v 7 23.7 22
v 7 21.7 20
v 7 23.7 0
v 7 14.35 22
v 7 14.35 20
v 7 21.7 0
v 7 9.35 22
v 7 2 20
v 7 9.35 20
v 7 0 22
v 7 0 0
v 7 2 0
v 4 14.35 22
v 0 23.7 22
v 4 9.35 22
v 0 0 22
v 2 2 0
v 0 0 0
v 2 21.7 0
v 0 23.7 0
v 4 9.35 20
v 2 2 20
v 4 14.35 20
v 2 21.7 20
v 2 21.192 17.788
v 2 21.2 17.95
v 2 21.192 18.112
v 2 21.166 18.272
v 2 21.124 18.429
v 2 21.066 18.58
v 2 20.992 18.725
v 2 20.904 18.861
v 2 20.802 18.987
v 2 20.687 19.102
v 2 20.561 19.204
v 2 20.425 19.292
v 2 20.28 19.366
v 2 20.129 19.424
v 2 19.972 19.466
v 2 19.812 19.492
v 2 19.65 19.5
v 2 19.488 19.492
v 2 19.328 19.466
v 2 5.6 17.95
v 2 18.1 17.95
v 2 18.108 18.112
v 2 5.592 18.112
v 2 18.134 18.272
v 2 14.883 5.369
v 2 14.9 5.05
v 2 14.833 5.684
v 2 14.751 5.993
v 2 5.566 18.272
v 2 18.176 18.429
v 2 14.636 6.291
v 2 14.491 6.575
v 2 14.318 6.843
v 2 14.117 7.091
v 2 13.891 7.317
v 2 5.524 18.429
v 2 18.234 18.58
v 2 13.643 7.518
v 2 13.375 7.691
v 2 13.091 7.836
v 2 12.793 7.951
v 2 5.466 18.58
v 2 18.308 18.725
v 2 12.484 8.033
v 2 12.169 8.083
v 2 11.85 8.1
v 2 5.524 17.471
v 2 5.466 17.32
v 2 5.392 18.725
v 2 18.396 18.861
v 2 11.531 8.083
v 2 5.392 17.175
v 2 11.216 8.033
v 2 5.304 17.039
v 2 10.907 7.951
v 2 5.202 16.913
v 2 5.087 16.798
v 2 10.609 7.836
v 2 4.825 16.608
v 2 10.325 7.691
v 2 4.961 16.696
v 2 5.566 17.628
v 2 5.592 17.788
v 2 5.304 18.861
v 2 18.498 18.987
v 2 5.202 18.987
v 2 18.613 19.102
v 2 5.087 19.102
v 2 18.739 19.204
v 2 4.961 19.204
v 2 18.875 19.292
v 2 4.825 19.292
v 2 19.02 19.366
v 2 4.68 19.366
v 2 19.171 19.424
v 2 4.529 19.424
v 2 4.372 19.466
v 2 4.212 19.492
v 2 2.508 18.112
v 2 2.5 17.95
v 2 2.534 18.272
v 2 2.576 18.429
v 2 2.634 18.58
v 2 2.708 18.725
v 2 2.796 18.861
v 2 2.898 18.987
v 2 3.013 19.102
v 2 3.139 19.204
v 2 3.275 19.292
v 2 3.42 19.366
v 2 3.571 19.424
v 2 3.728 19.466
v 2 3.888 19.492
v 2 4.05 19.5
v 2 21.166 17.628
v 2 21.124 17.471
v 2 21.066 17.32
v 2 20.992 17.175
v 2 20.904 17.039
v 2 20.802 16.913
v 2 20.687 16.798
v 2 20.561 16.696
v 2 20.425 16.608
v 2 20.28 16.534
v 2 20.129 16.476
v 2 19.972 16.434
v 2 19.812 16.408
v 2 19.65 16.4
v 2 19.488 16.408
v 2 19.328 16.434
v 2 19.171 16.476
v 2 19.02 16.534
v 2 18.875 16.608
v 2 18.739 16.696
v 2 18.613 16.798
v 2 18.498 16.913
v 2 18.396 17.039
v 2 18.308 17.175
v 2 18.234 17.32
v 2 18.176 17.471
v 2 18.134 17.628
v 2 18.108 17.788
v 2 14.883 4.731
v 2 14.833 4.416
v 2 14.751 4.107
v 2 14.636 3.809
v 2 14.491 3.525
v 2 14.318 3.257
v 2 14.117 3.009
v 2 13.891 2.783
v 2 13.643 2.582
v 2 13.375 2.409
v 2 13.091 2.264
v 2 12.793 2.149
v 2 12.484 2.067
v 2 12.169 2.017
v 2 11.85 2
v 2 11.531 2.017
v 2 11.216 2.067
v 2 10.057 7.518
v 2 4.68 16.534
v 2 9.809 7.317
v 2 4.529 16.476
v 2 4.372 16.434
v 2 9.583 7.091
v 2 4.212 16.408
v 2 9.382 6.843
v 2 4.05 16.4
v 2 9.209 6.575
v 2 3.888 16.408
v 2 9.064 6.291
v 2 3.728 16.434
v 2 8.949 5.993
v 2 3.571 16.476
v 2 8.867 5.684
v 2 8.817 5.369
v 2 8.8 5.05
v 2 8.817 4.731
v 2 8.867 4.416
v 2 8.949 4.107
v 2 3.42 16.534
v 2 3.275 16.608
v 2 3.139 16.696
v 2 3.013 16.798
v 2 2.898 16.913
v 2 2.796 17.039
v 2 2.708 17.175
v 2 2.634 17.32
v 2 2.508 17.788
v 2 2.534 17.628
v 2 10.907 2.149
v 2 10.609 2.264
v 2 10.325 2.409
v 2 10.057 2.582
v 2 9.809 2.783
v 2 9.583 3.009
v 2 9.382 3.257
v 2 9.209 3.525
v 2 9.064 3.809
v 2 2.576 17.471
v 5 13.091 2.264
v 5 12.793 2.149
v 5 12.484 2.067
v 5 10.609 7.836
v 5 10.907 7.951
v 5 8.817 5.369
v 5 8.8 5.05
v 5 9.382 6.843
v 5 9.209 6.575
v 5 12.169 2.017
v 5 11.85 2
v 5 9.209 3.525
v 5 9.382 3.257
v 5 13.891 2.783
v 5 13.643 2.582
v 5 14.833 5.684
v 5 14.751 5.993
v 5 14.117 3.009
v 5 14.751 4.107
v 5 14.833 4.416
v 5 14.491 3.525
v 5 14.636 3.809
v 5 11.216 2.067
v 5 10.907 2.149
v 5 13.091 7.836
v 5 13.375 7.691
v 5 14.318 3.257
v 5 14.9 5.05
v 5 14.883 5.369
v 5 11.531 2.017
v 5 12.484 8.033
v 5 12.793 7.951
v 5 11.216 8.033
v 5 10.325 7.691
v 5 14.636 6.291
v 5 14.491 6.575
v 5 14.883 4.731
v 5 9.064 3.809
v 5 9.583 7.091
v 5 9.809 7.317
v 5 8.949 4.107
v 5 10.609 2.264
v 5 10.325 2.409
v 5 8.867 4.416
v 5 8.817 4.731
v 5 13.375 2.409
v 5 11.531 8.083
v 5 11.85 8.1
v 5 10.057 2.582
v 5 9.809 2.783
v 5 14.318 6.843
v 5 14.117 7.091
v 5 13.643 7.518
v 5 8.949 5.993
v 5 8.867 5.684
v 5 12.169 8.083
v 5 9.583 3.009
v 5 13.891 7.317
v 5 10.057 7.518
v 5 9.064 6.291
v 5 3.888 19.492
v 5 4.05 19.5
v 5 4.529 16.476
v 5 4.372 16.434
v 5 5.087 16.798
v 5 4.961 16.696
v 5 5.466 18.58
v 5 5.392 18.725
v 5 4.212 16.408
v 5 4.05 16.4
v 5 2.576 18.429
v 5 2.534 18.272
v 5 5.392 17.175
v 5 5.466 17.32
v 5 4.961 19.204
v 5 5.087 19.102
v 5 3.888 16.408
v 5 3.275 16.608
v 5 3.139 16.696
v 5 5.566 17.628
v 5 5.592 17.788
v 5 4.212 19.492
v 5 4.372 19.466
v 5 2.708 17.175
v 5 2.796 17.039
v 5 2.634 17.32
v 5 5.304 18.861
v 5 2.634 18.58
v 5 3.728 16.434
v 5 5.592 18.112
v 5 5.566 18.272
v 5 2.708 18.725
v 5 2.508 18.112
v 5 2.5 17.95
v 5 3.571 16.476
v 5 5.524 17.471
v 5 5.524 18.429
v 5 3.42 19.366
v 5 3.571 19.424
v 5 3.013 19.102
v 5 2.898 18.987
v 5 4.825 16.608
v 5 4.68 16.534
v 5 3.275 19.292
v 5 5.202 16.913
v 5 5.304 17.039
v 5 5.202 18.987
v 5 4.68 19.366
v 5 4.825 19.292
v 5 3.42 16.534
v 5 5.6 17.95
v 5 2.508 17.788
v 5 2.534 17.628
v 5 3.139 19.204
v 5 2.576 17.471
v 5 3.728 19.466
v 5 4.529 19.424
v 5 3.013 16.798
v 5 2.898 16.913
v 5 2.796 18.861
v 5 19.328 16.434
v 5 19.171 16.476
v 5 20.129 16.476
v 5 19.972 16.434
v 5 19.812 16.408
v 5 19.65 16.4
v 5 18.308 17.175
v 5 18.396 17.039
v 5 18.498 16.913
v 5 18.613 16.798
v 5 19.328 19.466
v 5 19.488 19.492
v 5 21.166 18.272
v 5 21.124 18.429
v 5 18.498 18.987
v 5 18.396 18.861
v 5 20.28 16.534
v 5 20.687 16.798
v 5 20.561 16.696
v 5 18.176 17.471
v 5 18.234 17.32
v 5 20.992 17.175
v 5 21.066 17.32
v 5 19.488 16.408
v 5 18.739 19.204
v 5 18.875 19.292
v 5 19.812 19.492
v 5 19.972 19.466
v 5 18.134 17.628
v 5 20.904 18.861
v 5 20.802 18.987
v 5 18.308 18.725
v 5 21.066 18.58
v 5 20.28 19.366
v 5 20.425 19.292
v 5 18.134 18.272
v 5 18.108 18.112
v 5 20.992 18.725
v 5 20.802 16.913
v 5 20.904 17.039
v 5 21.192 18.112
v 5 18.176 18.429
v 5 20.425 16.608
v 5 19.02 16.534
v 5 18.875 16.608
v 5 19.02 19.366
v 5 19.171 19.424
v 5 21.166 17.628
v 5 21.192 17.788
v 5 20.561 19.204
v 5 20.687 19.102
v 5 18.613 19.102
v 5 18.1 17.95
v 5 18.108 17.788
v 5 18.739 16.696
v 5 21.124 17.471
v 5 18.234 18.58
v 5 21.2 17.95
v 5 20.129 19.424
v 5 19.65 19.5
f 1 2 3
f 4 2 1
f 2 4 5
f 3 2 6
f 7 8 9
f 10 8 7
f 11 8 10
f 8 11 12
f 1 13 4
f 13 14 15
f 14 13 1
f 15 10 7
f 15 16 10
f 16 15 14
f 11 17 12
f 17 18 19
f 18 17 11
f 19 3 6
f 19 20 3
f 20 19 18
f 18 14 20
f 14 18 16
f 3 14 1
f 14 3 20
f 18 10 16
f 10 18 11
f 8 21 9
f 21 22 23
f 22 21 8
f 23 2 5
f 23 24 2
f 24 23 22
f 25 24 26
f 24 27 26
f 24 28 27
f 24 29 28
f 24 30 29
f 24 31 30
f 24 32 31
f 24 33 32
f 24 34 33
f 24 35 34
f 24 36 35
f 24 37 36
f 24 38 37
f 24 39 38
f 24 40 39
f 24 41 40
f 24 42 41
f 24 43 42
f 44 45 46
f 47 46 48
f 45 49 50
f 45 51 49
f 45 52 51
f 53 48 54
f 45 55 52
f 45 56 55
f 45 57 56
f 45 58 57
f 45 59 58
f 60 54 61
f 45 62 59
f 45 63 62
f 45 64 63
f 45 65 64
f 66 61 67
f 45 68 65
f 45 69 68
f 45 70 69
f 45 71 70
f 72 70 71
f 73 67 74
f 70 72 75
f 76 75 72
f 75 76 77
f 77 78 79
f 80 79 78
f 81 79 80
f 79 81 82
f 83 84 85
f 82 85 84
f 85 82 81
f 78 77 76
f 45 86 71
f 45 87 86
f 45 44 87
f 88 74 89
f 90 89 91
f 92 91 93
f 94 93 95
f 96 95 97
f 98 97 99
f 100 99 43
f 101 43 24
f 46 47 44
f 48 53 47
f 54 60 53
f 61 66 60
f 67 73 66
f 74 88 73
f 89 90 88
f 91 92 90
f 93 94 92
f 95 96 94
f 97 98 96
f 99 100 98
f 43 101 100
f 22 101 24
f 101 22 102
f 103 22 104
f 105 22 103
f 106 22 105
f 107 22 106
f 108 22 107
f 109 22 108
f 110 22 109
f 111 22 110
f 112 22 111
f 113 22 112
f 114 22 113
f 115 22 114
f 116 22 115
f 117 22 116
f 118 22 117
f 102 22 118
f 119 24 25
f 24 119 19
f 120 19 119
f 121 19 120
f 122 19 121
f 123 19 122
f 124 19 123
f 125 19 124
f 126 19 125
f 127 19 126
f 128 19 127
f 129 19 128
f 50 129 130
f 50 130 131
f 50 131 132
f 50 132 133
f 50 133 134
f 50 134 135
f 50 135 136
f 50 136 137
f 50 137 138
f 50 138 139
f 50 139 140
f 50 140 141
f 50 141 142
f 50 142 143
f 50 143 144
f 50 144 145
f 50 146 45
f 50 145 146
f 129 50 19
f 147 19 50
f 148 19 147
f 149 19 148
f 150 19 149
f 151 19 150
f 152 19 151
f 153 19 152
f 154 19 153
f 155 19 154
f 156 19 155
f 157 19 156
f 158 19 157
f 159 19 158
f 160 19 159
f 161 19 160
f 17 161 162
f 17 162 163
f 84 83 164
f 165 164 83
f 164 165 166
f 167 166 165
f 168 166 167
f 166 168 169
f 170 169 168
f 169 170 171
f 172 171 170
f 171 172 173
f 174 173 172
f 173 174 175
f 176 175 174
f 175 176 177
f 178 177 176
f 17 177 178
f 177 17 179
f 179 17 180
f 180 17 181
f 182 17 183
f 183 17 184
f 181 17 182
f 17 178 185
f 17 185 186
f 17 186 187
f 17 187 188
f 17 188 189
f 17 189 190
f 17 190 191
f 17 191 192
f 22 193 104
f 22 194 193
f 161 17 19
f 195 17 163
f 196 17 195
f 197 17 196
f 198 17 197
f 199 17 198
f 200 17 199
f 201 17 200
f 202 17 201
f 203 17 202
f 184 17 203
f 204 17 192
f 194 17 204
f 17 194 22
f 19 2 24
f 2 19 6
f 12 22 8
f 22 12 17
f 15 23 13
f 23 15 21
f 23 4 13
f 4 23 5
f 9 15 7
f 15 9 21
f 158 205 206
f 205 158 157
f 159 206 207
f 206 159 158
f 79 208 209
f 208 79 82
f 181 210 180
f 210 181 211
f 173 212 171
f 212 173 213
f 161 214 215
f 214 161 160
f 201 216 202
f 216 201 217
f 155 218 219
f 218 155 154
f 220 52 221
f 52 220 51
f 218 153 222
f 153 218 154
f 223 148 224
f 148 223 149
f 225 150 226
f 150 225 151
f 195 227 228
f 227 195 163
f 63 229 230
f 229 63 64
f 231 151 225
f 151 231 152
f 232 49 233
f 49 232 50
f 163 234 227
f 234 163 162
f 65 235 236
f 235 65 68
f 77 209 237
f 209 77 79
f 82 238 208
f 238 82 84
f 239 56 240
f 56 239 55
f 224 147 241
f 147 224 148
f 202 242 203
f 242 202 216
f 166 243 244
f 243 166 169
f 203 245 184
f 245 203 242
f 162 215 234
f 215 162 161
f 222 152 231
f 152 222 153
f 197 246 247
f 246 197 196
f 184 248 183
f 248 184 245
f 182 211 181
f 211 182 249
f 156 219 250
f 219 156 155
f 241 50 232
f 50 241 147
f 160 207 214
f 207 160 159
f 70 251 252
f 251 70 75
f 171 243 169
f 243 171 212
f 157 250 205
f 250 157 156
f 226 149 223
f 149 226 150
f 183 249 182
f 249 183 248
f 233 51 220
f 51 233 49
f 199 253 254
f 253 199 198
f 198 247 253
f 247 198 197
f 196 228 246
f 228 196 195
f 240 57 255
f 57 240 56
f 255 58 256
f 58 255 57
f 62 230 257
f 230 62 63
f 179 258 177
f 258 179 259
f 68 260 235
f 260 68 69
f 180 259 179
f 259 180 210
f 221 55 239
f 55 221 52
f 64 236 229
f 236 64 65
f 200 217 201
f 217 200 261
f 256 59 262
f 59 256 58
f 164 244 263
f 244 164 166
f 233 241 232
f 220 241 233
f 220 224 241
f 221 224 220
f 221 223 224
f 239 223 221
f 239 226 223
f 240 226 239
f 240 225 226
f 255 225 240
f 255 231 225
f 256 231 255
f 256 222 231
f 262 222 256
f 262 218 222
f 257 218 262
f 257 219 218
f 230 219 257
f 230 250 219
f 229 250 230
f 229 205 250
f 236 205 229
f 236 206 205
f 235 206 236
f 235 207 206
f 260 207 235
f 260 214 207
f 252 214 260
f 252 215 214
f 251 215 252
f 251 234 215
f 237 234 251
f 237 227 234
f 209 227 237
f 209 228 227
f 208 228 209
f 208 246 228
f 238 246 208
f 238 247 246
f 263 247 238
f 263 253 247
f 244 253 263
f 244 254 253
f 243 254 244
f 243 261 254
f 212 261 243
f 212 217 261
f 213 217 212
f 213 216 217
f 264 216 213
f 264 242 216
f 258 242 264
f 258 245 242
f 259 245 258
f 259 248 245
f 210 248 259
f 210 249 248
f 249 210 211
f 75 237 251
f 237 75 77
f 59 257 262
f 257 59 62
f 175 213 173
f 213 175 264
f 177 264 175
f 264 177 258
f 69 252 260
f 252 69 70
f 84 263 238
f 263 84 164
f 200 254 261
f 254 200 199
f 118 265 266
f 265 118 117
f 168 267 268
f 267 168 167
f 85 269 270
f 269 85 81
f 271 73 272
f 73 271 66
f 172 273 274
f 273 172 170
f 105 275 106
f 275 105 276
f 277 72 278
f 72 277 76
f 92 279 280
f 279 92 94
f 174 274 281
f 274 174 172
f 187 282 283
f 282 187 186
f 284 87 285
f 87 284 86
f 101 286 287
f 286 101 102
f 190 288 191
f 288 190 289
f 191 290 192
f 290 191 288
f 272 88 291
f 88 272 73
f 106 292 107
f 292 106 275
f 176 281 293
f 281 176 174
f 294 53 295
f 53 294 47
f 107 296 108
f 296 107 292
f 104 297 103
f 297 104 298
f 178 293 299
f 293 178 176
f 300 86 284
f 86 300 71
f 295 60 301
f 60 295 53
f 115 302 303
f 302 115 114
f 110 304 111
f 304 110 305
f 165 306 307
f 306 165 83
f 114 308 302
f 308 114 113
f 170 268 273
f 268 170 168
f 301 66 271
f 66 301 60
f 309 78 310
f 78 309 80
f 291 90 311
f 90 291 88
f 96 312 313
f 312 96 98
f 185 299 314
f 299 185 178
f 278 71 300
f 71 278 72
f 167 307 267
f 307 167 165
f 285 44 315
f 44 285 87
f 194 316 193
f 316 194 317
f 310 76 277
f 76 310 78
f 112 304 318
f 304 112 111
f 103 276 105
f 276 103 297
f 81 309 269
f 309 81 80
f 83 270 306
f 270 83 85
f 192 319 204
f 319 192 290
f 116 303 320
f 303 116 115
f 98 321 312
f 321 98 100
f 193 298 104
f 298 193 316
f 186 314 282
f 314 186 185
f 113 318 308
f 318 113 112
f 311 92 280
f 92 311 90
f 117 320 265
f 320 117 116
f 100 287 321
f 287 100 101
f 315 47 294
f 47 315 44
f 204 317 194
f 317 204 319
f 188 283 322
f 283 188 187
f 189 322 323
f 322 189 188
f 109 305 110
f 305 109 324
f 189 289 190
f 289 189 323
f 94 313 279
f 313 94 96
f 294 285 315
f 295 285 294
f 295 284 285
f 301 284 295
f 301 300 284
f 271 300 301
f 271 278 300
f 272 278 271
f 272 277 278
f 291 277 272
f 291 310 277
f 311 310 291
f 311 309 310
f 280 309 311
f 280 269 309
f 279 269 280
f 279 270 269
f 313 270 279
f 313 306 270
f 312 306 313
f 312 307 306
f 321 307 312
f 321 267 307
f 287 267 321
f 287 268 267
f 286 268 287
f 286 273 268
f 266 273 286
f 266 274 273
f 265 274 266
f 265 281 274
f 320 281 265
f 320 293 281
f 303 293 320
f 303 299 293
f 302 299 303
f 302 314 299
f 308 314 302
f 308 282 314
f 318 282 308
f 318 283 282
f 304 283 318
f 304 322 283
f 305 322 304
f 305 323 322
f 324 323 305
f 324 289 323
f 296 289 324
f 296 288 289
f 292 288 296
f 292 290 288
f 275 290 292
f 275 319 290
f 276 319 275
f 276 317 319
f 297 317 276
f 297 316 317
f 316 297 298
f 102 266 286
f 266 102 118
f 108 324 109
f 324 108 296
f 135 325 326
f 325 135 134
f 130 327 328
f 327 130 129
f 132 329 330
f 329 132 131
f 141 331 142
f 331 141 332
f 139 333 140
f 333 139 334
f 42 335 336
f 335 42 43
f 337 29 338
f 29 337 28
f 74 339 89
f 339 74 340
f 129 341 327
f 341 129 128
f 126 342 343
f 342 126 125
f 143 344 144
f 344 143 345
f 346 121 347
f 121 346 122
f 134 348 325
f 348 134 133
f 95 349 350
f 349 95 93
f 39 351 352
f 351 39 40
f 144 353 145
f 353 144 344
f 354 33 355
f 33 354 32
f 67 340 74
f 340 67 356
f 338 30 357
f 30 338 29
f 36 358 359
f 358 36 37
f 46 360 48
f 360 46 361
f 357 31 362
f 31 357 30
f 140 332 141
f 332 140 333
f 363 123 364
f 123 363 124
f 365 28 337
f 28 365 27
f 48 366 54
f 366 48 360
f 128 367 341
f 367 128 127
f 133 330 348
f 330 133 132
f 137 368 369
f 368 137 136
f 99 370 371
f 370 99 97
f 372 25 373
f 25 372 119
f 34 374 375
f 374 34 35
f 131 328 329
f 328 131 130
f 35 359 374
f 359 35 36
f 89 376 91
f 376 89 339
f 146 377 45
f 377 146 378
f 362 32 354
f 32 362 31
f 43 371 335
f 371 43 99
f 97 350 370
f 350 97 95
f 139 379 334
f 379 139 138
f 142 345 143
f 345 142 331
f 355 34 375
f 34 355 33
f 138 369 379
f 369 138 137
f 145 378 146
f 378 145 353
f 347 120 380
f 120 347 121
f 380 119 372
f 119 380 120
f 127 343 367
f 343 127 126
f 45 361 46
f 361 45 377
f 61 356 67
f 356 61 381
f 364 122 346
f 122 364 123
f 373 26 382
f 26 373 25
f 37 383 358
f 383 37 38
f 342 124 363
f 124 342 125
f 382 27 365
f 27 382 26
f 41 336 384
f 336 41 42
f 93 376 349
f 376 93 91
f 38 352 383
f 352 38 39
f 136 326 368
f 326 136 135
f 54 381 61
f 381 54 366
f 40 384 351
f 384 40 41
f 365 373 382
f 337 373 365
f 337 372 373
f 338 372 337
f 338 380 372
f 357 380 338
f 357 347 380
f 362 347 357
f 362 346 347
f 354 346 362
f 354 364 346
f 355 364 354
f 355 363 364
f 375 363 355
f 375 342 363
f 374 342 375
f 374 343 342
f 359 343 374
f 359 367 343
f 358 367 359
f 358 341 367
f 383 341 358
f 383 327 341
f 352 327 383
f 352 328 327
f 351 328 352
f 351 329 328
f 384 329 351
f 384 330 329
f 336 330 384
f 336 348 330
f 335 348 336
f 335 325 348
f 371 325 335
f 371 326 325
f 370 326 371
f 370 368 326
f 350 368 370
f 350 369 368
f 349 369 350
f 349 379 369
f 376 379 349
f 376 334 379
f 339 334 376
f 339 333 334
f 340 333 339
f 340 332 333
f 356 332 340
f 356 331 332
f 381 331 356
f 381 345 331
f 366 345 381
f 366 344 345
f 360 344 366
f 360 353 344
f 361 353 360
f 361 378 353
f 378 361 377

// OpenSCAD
sRad = 1.55;
bRad = 3.05;
border = 2;
h = 20;
w = 19.7;
d = 5;
bW=w+(border*2);
bH=h+border;
bD=d+border;

union(){    
    difference(){
        cube([bD,bW,bH]);
            
        translate([border,border,0])
        cube([d,w,h]);
        
        translate([border+2,bW/2-2.5,bH-5])
        cube([10,5,20]);
    }
    
    translate([0,bW/2,bRad+2])
    rotate([0,90,0])
    cylinder(5,bRad,bRad,$fn=60);
    
    translate([0,border+sRad+0.5,h-sRad-0.5])
    rotate([0,90,0])
    cylinder(5,sRad,sRad,$fn=60);
    
    translate([0,w+border-sRad-0.5,h-sRad-0.5])
    rotate([0,90,0])
    cylinder(5,sRad,sRad,$fn=60);
}
